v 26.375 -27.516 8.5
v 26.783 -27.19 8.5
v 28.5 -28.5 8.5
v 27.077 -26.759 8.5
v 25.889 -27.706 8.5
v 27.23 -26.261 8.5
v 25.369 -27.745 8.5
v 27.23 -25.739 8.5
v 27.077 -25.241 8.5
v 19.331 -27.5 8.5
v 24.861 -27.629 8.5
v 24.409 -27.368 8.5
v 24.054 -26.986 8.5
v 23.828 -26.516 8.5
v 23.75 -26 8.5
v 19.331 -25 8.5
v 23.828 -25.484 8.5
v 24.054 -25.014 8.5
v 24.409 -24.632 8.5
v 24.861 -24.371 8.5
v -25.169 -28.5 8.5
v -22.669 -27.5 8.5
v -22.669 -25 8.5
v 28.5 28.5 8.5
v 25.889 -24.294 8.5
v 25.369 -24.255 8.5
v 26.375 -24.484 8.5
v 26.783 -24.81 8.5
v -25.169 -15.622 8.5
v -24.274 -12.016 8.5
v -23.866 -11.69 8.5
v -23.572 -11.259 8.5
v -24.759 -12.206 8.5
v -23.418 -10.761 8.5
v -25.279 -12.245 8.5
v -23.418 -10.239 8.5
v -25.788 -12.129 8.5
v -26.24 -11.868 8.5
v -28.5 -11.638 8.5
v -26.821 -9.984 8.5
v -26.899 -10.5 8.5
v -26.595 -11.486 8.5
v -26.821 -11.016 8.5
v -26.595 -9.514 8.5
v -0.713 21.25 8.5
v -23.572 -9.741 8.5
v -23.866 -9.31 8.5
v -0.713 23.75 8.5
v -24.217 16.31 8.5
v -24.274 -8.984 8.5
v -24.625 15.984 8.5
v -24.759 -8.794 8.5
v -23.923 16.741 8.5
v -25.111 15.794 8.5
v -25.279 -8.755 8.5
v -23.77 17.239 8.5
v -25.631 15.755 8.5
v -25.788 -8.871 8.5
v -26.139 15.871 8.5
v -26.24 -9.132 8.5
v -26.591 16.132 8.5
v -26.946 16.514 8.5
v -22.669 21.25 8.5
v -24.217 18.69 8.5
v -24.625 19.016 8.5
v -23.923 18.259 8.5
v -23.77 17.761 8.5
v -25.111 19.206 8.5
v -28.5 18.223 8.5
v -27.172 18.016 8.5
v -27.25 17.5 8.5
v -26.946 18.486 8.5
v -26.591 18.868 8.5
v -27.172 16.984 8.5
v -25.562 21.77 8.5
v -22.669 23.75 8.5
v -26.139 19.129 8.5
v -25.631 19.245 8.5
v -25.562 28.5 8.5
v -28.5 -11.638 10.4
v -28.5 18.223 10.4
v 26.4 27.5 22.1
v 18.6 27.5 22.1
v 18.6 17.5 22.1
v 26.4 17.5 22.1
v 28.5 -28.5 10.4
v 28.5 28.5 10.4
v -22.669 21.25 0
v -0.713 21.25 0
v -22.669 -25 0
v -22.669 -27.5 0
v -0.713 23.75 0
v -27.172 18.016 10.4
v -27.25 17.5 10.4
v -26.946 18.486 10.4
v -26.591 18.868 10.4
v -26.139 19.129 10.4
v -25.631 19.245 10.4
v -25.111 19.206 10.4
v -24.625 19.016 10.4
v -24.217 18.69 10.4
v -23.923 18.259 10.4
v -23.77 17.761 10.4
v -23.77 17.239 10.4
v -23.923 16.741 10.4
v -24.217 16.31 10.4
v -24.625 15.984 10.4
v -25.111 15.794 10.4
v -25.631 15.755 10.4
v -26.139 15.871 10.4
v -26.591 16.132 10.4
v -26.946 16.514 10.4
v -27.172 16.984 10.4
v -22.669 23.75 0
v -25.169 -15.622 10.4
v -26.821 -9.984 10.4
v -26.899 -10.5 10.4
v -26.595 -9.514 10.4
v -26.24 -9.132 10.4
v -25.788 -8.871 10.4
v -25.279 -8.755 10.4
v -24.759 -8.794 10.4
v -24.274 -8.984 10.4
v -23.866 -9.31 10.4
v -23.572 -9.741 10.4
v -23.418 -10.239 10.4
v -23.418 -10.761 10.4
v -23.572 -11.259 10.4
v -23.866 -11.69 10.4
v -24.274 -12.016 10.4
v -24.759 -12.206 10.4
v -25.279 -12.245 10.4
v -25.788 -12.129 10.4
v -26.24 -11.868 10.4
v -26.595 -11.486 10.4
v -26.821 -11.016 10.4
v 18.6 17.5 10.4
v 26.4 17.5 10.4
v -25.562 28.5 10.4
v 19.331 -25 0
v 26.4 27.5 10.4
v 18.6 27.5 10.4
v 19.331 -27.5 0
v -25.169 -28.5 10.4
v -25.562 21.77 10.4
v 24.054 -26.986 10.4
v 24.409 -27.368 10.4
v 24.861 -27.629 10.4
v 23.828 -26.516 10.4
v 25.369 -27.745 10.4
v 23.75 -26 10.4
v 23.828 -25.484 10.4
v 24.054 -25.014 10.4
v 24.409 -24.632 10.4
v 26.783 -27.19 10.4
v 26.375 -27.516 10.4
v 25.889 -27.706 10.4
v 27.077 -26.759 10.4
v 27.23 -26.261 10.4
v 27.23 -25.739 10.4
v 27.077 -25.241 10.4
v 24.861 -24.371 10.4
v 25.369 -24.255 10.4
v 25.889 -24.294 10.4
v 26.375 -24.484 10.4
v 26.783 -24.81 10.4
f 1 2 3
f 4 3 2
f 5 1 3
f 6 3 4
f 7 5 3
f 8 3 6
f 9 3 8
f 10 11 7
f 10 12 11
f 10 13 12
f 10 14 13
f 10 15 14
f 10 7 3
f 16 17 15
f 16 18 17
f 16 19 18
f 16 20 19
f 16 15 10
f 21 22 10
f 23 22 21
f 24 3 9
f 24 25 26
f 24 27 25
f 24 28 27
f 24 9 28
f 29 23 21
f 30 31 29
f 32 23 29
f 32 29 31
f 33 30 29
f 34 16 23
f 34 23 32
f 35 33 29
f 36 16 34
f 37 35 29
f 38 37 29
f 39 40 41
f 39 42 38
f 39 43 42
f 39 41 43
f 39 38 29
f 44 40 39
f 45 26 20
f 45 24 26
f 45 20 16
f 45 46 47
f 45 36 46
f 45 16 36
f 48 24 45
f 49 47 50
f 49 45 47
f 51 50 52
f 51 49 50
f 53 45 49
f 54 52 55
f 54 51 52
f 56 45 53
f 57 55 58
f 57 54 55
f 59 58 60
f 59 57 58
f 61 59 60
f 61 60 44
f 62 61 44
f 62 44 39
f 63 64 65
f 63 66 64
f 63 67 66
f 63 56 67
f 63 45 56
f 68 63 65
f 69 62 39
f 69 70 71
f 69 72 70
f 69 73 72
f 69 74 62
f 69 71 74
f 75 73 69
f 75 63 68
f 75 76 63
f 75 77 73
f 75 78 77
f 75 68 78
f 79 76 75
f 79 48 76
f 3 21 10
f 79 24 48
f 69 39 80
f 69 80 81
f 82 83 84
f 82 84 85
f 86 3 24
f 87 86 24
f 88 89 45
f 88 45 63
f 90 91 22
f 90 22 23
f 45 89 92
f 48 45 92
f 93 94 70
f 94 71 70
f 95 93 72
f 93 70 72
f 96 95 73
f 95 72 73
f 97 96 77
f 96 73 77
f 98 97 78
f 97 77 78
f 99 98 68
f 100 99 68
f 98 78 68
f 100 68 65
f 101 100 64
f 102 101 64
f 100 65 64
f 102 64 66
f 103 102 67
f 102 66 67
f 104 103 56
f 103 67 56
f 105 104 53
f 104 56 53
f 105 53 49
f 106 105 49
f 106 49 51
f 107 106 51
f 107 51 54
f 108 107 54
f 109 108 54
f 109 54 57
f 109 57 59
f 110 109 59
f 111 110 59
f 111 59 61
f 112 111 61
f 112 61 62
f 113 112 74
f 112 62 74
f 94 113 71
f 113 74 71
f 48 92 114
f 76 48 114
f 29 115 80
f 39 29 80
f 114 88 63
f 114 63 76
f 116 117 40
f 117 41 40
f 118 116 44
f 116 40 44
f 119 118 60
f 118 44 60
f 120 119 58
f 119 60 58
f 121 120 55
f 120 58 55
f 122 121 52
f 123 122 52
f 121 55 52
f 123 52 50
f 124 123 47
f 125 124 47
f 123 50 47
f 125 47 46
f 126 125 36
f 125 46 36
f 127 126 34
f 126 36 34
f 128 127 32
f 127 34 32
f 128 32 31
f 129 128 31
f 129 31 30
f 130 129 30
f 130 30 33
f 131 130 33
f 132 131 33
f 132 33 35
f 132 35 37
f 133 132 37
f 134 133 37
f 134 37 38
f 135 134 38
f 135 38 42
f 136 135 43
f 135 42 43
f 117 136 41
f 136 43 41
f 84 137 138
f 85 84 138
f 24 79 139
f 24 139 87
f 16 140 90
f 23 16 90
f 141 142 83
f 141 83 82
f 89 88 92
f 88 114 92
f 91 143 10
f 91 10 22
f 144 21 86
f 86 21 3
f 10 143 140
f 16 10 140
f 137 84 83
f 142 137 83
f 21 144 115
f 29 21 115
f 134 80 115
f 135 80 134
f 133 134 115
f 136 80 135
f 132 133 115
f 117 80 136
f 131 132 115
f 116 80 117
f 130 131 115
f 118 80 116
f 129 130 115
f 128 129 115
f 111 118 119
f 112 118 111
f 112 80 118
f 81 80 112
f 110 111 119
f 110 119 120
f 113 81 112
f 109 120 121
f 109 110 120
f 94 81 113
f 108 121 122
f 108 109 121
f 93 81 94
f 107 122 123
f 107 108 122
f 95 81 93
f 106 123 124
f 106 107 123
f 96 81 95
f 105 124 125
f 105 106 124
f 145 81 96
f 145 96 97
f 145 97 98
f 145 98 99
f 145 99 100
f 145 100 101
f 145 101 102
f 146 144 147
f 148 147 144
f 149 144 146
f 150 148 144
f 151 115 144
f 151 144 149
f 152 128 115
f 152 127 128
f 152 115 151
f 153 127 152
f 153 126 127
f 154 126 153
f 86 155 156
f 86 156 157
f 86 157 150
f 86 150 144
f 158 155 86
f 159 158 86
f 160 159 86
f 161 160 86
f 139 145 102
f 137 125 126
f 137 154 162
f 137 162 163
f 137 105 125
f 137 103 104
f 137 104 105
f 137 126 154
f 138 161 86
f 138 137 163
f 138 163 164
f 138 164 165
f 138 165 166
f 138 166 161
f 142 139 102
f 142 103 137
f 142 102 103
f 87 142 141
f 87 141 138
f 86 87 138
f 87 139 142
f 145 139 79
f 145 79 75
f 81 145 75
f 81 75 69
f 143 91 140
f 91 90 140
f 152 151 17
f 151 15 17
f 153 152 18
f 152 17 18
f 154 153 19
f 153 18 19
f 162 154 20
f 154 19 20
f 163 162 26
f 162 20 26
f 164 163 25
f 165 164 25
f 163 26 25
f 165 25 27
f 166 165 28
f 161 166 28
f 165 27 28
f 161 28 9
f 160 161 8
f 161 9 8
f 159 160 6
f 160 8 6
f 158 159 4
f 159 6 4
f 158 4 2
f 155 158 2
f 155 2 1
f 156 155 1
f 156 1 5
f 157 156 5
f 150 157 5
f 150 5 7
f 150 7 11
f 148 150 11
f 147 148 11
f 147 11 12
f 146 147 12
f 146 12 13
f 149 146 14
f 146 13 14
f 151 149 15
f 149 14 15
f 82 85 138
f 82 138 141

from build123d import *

# Parameters (mm, degrees)
SKETCH1_W                      = 57
SKETCH1_H                      = 57
BOSS_EXTRUDE1_DEPTH            = 10.4
SKETCH2_W                      = 7.8
SKETCH2_H                      = 10
BOSS_EXTRUDE3_DEPTH            = 11.7
F_3_5_3_5_DIAMETER_HOLE1_D     = 3.5
F_3_5_3_5_DIAMETER_HOLE1_DEPTH = 10.4
CUT_EXTRUDE1_REACH             = 12.4
SKETCH7_W                      = 21.956188663
SKETCH7_H                      = 2.5
SKETCH7_W_2                    = 42
CUT_EXTRUDE2_DEPTH             = 8.5


with BuildPart() as part:
    # Sketch1 → Boss-Extrude1 (new body)
    with BuildSketch(Plane.XY):
        Rectangle(SKETCH1_W, SKETCH1_H)
    extrude(amount=BOSS_EXTRUDE1_DEPTH)

    # Sketch2 → Boss-Extrude3 (add)
    with BuildSketch(Plane.XY.offset(10.4)):
        with Locations((22.5, 22.5)):
            Rectangle(SKETCH2_W, SKETCH2_H)
    extrude(amount=BOSS_EXTRUDE3_DEPTH)

    # Ø3.5 (3.5) Diameter Hole1
    with Locations(Plane.XY.offset(10.4)):
        with Locations((-25.5, 17.5), (-25.148622044, -10.5), (25.5, -26)):
            Hole(F_3_5_3_5_DIAMETER_HOLE1_D / 2, depth=F_3_5_3_5_DIAMETER_HOLE1_DEPTH)

    # Sketch6 → Cut-Extrude1 (cut, up to next)
    with BuildSketch(Plane.XY.offset(10.4), mode=Mode.PRIVATE) as cut_extrude1_sk1:
        Polygon((-25.562379587, 28.5), (-25.562379587, 21.769543161), (-28.5, 18.222574402), (-28.5, 28.5), align=None)
    cut_extrude1_tool1 = extrude(cut_extrude1_sk1.sketch, amount=-CUT_EXTRUDE1_REACH, mode=Mode.PRIVATE) & part.part
    add(cut_extrude1_tool1.solids().sort_by_distance((-27.133296, 24.186386, 10.4))[0], mode=Mode.SUBTRACT)
    # Sketch6 → Cut-Extrude1 (cut, up to next)
    with BuildSketch(Plane.XY.offset(10.4), mode=Mode.PRIVATE) as cut_extrude1_sk2:
        Polygon((-25.169304276, -15.622117115), (-28.5, -11.638473715), (-28.5, -28.5), (-25.169304276, -28.5), align=None)
    cut_extrude1_tool2 = extrude(cut_extrude1_sk2.sketch, amount=-CUT_EXTRUDE1_REACH, mode=Mode.PRIVATE) & part.part
    add(cut_extrude1_tool2.solids().sort_by_distance((-26.909011, -21.02068, 10.4))[0], mode=Mode.SUBTRACT)

    # Sketch7 → Cut-Extrude2 (cut)
    with BuildSketch(Plane(origin=(0, 0, 0), x_dir=(-1, 0, 0), z_dir=(0, 0, -1))):
        Polygon((-28.5, -28.5), (25.169304276, -28.5), (25.169304276, -15.622117115), (28.5, -11.638473715), (28.5, 18.222574402), (25.562379587, 21.769543161), (25.562379587, 28.5), (-28.5, 28.5), align=None)
        with Locations((11.691209945, 22.5)):
            Rectangle(SKETCH7_W, SKETCH7_H, mode=Mode.SUBTRACT)
        with Locations((1.669304276, -26.25)):
            Rectangle(SKETCH7_W_2, SKETCH7_H, mode=Mode.SUBTRACT)
    extrude(amount=-CUT_EXTRUDE2_DEPTH, mode=Mode.SUBTRACT)


solid = part.part
